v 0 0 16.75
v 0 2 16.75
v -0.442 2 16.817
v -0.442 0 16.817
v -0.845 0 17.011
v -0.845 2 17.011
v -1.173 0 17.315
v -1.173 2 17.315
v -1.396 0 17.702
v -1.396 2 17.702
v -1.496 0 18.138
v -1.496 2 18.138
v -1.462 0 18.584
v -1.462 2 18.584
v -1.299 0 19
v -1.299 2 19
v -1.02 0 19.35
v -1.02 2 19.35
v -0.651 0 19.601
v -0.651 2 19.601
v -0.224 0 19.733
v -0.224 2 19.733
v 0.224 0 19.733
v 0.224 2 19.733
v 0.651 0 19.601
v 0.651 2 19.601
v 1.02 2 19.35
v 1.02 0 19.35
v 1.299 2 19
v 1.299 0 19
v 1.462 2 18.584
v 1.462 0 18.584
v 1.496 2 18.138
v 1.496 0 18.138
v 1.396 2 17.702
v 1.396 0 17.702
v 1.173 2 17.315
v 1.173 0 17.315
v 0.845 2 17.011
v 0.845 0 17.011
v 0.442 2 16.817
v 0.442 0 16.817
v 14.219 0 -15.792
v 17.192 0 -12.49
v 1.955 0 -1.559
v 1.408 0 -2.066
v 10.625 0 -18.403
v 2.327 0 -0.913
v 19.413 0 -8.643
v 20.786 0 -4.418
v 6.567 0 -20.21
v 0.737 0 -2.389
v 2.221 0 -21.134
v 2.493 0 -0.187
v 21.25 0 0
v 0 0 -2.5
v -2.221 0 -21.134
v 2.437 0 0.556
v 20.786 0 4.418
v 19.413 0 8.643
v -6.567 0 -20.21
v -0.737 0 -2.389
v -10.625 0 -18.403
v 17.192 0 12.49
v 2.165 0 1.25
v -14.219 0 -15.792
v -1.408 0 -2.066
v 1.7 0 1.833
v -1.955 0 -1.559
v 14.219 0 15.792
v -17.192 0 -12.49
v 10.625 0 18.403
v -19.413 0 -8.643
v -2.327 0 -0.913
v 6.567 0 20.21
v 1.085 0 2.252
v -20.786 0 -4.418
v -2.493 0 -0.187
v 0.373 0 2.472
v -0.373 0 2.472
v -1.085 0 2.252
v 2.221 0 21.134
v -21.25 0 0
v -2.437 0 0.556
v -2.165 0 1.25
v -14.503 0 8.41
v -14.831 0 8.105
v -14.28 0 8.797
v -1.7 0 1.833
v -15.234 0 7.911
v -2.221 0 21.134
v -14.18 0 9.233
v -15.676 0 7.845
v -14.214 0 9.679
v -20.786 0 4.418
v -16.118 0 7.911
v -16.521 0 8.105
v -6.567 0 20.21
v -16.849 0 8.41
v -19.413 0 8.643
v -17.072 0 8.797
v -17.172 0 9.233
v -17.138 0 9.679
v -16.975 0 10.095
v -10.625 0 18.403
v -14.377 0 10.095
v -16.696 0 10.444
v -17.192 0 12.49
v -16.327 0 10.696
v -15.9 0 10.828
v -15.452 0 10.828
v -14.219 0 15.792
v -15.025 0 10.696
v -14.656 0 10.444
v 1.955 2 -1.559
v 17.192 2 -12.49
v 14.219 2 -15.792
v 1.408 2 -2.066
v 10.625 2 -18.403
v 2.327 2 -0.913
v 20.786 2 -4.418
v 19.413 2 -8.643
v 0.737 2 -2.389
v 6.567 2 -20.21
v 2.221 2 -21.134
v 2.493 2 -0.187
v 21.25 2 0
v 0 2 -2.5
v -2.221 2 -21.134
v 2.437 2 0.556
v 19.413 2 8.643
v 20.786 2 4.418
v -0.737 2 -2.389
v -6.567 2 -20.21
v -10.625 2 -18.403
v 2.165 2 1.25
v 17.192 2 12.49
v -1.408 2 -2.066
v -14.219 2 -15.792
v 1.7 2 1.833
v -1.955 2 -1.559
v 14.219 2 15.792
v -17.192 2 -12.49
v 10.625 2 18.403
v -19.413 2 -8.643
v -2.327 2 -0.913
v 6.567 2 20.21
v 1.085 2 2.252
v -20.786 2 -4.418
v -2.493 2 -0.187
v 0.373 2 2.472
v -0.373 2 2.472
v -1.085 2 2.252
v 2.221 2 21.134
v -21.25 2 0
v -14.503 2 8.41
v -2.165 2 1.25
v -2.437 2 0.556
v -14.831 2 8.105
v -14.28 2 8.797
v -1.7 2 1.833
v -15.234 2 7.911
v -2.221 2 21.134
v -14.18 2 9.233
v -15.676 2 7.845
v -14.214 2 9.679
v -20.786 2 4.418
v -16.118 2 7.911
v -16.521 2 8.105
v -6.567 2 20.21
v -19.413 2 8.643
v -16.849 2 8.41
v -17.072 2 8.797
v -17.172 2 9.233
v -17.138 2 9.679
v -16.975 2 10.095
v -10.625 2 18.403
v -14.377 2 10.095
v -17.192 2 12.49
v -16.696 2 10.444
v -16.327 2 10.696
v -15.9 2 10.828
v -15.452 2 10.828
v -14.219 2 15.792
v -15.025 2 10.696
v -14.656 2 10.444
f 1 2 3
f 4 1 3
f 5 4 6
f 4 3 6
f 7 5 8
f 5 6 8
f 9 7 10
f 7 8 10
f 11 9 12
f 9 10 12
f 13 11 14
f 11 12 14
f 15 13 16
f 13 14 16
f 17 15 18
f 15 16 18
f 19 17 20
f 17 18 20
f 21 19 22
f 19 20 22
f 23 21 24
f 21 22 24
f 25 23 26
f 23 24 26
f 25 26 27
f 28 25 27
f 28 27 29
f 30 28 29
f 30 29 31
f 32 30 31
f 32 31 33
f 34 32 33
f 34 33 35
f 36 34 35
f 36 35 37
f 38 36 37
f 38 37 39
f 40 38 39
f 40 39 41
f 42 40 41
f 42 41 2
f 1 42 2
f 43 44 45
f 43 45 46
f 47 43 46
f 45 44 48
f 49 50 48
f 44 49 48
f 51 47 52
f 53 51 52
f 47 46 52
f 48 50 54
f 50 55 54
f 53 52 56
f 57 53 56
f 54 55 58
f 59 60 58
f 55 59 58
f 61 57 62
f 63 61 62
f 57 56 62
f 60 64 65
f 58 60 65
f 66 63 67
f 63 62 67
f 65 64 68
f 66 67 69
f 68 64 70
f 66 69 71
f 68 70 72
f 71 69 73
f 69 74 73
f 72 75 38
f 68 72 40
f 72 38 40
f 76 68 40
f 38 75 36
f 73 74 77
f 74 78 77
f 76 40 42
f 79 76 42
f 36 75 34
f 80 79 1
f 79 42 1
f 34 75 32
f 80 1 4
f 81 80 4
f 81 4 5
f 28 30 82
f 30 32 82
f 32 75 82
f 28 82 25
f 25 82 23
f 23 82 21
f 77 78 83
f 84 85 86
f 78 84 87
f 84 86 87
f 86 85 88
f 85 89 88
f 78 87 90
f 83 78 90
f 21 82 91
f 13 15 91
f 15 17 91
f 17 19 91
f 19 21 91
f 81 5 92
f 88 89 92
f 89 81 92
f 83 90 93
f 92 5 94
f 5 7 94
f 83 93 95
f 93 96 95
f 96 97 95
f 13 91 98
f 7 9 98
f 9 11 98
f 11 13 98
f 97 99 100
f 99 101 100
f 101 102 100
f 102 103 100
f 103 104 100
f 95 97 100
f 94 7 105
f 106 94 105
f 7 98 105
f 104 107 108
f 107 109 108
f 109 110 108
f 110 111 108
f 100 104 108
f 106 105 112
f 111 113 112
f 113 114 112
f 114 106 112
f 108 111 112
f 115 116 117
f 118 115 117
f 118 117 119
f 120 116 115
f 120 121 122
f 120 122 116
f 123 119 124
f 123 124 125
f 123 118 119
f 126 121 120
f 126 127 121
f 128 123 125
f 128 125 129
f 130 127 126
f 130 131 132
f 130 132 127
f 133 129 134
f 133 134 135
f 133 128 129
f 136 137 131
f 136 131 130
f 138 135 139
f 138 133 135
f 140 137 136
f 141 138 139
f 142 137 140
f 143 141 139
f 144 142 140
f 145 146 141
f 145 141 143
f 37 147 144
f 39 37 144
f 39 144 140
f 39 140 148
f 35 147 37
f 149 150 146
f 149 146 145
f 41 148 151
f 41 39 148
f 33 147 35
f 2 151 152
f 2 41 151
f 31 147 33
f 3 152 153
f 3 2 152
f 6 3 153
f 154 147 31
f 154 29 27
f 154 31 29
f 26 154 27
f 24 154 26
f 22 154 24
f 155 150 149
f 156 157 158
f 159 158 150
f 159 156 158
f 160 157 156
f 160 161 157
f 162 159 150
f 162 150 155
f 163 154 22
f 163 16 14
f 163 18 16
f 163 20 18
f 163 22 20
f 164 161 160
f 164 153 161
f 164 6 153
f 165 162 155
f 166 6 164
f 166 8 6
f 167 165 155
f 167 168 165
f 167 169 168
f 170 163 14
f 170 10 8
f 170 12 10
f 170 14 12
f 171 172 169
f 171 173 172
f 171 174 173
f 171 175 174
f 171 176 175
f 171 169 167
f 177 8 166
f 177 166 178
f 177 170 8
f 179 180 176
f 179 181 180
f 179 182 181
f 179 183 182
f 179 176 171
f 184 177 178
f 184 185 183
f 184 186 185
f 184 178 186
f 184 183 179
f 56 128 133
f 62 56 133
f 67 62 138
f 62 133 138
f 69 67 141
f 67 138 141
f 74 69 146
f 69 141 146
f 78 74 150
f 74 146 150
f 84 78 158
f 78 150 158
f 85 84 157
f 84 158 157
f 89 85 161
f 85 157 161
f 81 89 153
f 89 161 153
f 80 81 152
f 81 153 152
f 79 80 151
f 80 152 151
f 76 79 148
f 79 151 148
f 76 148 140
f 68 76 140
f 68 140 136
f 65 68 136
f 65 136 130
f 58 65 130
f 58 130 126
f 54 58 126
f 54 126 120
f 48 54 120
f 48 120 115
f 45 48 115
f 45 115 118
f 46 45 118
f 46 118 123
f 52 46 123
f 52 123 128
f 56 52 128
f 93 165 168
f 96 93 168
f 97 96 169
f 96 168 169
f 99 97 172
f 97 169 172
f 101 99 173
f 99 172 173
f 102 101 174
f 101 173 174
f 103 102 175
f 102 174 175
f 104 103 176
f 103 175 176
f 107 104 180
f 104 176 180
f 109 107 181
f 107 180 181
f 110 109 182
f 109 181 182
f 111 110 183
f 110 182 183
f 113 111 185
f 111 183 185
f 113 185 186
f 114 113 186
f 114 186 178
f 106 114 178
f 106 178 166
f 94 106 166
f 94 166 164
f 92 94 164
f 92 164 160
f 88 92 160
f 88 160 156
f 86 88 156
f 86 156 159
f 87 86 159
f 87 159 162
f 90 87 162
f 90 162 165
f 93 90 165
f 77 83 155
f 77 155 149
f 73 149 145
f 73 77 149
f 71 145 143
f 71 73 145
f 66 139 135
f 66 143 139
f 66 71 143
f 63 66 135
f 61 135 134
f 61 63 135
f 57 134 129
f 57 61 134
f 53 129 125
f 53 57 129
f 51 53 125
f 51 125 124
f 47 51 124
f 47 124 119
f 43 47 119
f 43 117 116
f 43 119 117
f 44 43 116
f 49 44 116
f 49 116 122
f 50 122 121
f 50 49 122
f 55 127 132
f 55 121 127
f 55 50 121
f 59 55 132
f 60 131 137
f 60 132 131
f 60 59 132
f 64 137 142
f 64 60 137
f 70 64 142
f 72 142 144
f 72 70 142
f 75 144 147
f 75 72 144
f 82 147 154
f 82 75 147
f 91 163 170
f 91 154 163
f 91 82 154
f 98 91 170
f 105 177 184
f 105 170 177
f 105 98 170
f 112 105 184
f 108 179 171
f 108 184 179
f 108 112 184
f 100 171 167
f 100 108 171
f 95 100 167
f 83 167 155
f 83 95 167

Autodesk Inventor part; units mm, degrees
ref_plane "YZ Plane" through (0, 0, 0) normal (1, 0, 0) x (0, 1, 0)
ref_plane "XZ Plane" through (0, 0, 0) normal (0, 1, 0) x (-1, 0, 0)
ref_plane "XY Plane" through (0, 0, 0) normal (0, 0, 1) x (1, 0, 0)
sketch "Sketch1" plane through (0, 0, 0) normal (0, 1, 0) x (-1, 0, 0)
  circle A0 centre (0, 0) radius 21.25
  circle A1 centre (0, 0) radius 18.25
  point P0 (0, 18.25)
  point P1 (15.676, 9.3448)
  dimension "d0" = 42.5
  dimension "d3" = 3
  dimension "d4" = 59.2
extrude "Extrusion1" add sketch "Sketch1" along normal blind 2 contours A0 | A1
hole "Hole1" at (0, 0, 18.25) at (-15.676, 0, 9.3448) direction (0, 1, 0) diameter 3 depth 8 tip angle 118
hole "Hole2" at (0, 0, 0) direction (0, 1, 0) diameter 5 depth 8 tip angle 118
properties part number "RotatoryDisk"
